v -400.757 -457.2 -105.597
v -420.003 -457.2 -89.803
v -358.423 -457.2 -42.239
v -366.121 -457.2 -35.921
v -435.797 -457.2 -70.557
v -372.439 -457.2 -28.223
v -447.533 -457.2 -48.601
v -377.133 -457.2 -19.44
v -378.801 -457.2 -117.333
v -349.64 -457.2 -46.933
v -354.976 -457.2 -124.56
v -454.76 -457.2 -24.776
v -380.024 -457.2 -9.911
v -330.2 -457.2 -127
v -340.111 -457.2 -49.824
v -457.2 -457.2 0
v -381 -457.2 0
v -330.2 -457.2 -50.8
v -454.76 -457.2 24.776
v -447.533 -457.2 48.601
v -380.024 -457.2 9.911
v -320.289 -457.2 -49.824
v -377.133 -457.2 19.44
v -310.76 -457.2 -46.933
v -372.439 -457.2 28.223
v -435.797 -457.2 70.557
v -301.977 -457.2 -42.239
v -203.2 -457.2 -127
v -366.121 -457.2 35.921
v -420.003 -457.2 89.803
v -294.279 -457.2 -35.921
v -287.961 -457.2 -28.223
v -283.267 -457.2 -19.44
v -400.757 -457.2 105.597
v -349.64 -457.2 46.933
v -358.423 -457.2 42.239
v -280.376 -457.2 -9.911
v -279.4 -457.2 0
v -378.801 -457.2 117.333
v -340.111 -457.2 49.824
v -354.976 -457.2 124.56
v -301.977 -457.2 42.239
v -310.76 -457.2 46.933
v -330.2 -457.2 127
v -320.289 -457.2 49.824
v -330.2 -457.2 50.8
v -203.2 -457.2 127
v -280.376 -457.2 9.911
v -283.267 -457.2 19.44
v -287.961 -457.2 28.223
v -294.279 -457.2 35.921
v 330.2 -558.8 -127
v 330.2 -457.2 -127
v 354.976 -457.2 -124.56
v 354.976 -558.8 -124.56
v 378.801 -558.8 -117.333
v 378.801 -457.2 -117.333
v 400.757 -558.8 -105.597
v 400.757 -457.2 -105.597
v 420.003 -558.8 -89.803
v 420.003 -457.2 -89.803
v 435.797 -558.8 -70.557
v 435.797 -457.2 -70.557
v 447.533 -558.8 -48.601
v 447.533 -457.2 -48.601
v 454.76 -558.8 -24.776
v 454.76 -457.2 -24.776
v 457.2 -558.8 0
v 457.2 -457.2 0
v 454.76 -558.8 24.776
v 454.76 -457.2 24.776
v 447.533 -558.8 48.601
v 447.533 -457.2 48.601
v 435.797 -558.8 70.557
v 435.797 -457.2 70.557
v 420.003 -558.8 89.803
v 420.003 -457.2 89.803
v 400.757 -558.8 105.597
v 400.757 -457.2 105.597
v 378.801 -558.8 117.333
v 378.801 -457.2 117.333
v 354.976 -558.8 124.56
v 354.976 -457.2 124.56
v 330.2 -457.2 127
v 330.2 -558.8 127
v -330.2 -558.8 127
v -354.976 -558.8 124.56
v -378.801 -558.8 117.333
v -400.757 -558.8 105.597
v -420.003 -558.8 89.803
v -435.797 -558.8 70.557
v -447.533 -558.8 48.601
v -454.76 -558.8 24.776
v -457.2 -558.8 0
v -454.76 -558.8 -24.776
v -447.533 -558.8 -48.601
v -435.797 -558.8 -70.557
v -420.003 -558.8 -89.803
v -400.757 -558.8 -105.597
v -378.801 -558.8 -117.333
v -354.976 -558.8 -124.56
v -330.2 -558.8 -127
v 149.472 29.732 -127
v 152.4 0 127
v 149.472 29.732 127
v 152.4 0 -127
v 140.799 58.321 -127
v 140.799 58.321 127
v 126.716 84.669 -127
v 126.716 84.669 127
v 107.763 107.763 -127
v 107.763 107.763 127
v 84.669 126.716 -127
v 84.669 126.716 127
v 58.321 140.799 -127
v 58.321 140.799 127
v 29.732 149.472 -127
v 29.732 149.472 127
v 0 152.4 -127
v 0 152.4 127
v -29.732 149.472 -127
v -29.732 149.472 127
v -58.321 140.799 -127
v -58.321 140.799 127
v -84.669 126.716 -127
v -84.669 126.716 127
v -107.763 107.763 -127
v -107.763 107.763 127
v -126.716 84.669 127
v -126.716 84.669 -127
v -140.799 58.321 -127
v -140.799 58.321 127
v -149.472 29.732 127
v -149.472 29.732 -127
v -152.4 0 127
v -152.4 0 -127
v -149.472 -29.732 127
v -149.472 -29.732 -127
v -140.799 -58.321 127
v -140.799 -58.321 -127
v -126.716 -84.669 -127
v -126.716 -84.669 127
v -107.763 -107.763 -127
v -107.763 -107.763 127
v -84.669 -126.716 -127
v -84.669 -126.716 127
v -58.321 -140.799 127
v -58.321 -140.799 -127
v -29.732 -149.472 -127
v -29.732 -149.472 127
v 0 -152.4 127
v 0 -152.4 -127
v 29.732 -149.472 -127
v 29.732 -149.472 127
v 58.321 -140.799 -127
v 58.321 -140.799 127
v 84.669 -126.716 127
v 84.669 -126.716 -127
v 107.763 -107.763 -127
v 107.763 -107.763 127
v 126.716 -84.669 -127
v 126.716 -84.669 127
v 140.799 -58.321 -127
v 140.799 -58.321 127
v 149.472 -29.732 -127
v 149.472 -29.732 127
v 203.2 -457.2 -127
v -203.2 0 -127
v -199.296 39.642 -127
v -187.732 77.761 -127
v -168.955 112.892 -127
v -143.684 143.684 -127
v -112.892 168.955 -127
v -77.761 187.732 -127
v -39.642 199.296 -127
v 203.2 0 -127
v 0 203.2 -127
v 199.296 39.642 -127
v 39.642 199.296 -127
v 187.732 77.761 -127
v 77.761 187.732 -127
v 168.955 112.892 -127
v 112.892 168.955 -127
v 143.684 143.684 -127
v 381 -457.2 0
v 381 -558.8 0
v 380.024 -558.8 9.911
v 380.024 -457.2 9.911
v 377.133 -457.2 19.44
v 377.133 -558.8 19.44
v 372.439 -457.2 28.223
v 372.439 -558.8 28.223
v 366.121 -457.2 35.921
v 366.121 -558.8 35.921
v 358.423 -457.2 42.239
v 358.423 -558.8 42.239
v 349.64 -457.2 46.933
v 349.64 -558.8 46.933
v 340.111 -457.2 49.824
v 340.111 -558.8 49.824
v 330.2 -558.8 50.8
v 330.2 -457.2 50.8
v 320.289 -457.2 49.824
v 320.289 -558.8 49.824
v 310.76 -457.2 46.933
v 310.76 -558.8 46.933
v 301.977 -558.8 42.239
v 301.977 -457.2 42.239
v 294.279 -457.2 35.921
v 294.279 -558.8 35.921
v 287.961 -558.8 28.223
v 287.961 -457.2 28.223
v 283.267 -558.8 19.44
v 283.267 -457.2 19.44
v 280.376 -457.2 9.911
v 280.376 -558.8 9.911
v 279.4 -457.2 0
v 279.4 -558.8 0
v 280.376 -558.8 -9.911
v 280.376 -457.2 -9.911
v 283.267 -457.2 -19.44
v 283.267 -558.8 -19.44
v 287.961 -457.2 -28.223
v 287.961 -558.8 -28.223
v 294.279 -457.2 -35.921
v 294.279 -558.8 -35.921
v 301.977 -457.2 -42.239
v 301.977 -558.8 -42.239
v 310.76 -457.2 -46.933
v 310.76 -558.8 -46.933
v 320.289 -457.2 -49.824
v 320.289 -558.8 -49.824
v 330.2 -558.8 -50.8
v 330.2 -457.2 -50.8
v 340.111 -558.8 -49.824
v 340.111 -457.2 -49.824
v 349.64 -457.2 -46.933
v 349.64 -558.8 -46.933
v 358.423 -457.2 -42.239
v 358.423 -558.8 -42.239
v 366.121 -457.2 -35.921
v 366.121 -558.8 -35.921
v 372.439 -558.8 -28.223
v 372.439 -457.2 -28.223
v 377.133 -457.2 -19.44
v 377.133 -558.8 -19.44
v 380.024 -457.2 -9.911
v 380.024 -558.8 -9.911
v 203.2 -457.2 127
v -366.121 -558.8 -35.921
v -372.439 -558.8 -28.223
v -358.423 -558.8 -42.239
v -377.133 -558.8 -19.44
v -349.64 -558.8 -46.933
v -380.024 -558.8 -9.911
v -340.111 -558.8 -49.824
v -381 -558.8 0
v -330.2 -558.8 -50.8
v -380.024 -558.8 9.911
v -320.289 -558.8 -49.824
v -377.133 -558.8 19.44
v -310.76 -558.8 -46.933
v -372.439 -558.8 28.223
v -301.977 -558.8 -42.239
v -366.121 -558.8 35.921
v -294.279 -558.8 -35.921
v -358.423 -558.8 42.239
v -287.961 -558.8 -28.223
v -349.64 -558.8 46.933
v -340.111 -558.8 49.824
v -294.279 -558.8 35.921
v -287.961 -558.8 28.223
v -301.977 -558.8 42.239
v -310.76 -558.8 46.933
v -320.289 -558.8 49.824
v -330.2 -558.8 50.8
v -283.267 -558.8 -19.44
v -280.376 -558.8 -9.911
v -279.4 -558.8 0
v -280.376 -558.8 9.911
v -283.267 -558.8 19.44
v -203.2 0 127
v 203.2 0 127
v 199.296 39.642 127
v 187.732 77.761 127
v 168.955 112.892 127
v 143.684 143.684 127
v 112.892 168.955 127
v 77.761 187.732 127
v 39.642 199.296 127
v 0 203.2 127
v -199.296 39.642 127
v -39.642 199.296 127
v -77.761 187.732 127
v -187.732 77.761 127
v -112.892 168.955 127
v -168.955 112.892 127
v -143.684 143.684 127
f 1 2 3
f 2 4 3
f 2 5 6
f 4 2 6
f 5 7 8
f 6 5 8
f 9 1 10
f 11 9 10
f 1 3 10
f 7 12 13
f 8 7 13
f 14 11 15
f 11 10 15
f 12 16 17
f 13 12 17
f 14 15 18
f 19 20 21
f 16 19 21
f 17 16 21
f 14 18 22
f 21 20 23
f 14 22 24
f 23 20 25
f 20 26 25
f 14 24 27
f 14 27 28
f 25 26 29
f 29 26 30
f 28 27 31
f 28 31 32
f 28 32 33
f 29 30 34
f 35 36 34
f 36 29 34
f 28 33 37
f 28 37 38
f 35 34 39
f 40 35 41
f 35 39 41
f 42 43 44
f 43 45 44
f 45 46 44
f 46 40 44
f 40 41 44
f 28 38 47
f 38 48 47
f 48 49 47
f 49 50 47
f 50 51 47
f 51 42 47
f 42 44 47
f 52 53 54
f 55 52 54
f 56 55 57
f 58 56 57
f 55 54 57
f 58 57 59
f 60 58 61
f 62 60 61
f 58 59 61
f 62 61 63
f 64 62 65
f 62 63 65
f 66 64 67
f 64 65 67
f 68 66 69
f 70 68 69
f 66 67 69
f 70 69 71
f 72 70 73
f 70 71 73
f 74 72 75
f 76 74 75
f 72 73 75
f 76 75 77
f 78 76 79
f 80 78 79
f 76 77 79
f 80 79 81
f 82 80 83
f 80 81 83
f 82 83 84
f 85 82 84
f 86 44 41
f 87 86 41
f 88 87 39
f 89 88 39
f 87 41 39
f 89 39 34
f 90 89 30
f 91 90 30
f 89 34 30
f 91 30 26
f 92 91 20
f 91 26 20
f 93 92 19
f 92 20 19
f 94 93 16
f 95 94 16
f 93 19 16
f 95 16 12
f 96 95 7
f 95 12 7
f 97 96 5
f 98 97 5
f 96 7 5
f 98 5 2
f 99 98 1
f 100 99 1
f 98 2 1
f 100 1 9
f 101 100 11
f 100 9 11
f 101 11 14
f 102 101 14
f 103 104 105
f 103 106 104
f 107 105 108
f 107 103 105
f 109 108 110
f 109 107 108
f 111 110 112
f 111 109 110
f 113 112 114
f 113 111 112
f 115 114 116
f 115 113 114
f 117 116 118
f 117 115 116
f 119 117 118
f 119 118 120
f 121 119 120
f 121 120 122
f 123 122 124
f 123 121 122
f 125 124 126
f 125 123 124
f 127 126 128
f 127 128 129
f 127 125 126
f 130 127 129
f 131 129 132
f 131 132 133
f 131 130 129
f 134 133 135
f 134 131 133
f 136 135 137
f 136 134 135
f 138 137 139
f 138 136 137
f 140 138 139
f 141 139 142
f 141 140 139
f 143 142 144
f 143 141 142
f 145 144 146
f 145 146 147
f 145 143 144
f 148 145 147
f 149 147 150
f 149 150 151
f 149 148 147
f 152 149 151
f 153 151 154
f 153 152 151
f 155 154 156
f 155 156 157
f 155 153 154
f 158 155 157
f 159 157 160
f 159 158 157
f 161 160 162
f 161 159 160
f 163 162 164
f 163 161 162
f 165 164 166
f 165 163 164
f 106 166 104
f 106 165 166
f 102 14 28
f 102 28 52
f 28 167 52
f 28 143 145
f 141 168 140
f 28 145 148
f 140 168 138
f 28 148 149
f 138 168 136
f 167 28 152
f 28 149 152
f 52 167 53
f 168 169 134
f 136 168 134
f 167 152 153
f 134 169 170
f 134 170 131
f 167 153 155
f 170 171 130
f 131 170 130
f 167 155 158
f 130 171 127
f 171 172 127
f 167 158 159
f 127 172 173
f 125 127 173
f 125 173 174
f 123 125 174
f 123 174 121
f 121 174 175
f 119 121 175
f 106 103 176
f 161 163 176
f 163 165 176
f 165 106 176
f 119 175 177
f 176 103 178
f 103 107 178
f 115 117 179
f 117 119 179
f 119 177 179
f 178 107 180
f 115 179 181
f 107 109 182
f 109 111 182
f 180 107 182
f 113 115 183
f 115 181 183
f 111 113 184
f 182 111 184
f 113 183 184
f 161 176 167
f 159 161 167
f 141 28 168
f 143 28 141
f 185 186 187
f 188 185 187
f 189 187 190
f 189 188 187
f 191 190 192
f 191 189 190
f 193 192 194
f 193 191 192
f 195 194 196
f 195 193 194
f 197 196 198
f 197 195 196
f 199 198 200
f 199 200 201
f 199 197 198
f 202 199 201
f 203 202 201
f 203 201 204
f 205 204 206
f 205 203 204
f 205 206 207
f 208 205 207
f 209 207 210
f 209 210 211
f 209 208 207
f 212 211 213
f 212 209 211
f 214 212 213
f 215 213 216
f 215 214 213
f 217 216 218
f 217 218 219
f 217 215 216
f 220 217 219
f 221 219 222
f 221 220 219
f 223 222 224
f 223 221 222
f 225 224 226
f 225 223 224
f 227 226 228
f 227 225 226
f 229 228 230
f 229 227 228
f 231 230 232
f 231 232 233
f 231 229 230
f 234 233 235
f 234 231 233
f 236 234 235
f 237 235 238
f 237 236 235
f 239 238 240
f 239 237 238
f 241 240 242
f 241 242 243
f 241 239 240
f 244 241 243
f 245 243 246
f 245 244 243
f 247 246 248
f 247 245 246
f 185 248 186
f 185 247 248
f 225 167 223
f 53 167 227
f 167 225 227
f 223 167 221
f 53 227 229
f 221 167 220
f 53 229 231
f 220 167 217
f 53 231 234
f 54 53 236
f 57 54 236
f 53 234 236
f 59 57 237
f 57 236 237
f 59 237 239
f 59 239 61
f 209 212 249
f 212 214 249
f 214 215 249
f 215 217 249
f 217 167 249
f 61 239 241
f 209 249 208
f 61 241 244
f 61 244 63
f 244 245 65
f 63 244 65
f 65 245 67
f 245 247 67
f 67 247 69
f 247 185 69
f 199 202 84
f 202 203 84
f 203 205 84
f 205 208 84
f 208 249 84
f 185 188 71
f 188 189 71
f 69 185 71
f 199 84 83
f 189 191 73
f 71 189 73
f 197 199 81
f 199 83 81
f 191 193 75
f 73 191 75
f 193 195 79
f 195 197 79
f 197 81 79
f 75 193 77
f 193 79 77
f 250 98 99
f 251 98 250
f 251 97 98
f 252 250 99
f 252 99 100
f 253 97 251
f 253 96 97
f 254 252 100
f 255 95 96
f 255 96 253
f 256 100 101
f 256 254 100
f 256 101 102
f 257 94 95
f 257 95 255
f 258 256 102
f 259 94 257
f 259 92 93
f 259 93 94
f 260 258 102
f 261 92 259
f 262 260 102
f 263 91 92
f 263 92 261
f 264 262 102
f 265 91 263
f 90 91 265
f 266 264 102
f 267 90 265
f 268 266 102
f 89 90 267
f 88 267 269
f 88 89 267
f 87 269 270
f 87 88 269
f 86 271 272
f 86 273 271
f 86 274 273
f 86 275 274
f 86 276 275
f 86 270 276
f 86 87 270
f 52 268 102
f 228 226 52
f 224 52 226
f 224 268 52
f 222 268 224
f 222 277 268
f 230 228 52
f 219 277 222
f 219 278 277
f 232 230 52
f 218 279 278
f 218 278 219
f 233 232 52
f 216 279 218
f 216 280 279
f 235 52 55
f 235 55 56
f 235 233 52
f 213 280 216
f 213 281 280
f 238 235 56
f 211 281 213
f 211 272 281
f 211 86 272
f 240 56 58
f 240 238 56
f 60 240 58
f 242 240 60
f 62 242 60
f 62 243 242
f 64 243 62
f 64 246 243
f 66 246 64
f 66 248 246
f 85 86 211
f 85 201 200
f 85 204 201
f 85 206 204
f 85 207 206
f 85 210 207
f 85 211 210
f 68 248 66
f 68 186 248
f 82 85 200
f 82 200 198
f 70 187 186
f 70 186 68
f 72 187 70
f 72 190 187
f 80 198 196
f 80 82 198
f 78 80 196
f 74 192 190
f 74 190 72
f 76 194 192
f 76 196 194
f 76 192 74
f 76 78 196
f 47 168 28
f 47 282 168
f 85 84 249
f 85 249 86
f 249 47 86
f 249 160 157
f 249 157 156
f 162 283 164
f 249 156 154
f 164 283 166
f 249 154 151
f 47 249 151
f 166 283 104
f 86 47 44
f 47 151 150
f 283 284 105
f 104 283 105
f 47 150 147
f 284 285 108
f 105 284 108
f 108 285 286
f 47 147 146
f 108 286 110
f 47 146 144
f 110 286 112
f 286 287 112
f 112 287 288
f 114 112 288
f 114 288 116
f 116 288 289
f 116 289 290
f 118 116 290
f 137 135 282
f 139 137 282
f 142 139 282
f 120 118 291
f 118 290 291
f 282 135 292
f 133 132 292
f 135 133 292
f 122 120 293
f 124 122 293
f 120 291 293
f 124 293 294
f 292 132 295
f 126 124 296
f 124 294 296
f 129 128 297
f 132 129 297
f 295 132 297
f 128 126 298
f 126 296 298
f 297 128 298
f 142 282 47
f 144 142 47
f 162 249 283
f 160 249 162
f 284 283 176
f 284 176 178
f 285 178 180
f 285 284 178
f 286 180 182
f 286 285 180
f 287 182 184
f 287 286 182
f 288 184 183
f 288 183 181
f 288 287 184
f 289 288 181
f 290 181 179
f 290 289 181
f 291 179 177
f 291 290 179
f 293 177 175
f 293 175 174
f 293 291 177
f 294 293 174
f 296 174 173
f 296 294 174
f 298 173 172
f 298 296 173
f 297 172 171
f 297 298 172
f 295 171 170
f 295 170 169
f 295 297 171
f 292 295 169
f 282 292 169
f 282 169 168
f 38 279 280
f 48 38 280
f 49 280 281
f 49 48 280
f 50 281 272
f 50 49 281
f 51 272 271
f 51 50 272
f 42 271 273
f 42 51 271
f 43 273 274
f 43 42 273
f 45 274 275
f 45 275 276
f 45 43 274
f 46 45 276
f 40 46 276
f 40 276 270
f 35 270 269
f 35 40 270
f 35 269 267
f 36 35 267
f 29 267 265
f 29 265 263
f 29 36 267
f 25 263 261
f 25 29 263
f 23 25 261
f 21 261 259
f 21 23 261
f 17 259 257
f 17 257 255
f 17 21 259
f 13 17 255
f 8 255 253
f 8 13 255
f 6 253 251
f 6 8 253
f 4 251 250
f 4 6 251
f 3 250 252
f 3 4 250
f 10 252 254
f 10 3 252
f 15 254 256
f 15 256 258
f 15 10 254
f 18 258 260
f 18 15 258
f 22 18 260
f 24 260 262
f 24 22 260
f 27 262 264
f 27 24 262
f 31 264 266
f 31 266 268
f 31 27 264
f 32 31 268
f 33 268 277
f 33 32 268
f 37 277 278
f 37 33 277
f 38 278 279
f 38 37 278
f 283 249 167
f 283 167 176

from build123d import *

# Parameters (mm, degrees)
SKETCH1_R           = 152.4
BOSS_EXTRUDE1_DEPTH = 127
SKETCH2_R           = 50.8
BOSS_EXTRUDE2_DEPTH = 101.6


with BuildPart() as part:
    # Sketch1 → Boss-Extrude1 (new, symmetric)
    with BuildSketch(Plane.XY):
        with BuildLine():
            Line((-203.2, -457.2), (203.2, -457.2))
            Line((203.2, -457.2), (203.2, 0))
            ThreePointArc((203.2, 0), (0, 203.2), (-203.2, 0))
            Line((-203.2, 0), (-203.2, -457.2))
        make_face()
        Circle(SKETCH1_R, mode=Mode.SUBTRACT)
    extrude(amount=BOSS_EXTRUDE1_DEPTH, both=True)

    # Sketch2 → Boss-Extrude2 (add)
    with BuildSketch(Plane.XZ.offset(457.2)):
        with BuildLine():
            Line((-203.2, -127), (203.2, -127))
            Line((203.2, -127), (330.2, -127))
            ThreePointArc((330.2, -127), (457.2, 0), (330.2, 127))
            Line((330.2, 127), (203.2, 127))
            Line((203.2, 127), (-203.2, 127))
            Line((-203.2, 127), (-330.2, 127))
            ThreePointArc((-330.2, 127), (-457.2, 0), (-330.2, -127))
            Line((-330.2, -127), (-203.2, -127))
        make_face()
        with Locations((-330.2, 0)):
            Circle(SKETCH2_R, mode=Mode.SUBTRACT)
        with Locations((330.2, 0)):
            Circle(SKETCH2_R, mode=Mode.SUBTRACT)
    extrude(amount=BOSS_EXTRUDE2_DEPTH)


solid = part.part
